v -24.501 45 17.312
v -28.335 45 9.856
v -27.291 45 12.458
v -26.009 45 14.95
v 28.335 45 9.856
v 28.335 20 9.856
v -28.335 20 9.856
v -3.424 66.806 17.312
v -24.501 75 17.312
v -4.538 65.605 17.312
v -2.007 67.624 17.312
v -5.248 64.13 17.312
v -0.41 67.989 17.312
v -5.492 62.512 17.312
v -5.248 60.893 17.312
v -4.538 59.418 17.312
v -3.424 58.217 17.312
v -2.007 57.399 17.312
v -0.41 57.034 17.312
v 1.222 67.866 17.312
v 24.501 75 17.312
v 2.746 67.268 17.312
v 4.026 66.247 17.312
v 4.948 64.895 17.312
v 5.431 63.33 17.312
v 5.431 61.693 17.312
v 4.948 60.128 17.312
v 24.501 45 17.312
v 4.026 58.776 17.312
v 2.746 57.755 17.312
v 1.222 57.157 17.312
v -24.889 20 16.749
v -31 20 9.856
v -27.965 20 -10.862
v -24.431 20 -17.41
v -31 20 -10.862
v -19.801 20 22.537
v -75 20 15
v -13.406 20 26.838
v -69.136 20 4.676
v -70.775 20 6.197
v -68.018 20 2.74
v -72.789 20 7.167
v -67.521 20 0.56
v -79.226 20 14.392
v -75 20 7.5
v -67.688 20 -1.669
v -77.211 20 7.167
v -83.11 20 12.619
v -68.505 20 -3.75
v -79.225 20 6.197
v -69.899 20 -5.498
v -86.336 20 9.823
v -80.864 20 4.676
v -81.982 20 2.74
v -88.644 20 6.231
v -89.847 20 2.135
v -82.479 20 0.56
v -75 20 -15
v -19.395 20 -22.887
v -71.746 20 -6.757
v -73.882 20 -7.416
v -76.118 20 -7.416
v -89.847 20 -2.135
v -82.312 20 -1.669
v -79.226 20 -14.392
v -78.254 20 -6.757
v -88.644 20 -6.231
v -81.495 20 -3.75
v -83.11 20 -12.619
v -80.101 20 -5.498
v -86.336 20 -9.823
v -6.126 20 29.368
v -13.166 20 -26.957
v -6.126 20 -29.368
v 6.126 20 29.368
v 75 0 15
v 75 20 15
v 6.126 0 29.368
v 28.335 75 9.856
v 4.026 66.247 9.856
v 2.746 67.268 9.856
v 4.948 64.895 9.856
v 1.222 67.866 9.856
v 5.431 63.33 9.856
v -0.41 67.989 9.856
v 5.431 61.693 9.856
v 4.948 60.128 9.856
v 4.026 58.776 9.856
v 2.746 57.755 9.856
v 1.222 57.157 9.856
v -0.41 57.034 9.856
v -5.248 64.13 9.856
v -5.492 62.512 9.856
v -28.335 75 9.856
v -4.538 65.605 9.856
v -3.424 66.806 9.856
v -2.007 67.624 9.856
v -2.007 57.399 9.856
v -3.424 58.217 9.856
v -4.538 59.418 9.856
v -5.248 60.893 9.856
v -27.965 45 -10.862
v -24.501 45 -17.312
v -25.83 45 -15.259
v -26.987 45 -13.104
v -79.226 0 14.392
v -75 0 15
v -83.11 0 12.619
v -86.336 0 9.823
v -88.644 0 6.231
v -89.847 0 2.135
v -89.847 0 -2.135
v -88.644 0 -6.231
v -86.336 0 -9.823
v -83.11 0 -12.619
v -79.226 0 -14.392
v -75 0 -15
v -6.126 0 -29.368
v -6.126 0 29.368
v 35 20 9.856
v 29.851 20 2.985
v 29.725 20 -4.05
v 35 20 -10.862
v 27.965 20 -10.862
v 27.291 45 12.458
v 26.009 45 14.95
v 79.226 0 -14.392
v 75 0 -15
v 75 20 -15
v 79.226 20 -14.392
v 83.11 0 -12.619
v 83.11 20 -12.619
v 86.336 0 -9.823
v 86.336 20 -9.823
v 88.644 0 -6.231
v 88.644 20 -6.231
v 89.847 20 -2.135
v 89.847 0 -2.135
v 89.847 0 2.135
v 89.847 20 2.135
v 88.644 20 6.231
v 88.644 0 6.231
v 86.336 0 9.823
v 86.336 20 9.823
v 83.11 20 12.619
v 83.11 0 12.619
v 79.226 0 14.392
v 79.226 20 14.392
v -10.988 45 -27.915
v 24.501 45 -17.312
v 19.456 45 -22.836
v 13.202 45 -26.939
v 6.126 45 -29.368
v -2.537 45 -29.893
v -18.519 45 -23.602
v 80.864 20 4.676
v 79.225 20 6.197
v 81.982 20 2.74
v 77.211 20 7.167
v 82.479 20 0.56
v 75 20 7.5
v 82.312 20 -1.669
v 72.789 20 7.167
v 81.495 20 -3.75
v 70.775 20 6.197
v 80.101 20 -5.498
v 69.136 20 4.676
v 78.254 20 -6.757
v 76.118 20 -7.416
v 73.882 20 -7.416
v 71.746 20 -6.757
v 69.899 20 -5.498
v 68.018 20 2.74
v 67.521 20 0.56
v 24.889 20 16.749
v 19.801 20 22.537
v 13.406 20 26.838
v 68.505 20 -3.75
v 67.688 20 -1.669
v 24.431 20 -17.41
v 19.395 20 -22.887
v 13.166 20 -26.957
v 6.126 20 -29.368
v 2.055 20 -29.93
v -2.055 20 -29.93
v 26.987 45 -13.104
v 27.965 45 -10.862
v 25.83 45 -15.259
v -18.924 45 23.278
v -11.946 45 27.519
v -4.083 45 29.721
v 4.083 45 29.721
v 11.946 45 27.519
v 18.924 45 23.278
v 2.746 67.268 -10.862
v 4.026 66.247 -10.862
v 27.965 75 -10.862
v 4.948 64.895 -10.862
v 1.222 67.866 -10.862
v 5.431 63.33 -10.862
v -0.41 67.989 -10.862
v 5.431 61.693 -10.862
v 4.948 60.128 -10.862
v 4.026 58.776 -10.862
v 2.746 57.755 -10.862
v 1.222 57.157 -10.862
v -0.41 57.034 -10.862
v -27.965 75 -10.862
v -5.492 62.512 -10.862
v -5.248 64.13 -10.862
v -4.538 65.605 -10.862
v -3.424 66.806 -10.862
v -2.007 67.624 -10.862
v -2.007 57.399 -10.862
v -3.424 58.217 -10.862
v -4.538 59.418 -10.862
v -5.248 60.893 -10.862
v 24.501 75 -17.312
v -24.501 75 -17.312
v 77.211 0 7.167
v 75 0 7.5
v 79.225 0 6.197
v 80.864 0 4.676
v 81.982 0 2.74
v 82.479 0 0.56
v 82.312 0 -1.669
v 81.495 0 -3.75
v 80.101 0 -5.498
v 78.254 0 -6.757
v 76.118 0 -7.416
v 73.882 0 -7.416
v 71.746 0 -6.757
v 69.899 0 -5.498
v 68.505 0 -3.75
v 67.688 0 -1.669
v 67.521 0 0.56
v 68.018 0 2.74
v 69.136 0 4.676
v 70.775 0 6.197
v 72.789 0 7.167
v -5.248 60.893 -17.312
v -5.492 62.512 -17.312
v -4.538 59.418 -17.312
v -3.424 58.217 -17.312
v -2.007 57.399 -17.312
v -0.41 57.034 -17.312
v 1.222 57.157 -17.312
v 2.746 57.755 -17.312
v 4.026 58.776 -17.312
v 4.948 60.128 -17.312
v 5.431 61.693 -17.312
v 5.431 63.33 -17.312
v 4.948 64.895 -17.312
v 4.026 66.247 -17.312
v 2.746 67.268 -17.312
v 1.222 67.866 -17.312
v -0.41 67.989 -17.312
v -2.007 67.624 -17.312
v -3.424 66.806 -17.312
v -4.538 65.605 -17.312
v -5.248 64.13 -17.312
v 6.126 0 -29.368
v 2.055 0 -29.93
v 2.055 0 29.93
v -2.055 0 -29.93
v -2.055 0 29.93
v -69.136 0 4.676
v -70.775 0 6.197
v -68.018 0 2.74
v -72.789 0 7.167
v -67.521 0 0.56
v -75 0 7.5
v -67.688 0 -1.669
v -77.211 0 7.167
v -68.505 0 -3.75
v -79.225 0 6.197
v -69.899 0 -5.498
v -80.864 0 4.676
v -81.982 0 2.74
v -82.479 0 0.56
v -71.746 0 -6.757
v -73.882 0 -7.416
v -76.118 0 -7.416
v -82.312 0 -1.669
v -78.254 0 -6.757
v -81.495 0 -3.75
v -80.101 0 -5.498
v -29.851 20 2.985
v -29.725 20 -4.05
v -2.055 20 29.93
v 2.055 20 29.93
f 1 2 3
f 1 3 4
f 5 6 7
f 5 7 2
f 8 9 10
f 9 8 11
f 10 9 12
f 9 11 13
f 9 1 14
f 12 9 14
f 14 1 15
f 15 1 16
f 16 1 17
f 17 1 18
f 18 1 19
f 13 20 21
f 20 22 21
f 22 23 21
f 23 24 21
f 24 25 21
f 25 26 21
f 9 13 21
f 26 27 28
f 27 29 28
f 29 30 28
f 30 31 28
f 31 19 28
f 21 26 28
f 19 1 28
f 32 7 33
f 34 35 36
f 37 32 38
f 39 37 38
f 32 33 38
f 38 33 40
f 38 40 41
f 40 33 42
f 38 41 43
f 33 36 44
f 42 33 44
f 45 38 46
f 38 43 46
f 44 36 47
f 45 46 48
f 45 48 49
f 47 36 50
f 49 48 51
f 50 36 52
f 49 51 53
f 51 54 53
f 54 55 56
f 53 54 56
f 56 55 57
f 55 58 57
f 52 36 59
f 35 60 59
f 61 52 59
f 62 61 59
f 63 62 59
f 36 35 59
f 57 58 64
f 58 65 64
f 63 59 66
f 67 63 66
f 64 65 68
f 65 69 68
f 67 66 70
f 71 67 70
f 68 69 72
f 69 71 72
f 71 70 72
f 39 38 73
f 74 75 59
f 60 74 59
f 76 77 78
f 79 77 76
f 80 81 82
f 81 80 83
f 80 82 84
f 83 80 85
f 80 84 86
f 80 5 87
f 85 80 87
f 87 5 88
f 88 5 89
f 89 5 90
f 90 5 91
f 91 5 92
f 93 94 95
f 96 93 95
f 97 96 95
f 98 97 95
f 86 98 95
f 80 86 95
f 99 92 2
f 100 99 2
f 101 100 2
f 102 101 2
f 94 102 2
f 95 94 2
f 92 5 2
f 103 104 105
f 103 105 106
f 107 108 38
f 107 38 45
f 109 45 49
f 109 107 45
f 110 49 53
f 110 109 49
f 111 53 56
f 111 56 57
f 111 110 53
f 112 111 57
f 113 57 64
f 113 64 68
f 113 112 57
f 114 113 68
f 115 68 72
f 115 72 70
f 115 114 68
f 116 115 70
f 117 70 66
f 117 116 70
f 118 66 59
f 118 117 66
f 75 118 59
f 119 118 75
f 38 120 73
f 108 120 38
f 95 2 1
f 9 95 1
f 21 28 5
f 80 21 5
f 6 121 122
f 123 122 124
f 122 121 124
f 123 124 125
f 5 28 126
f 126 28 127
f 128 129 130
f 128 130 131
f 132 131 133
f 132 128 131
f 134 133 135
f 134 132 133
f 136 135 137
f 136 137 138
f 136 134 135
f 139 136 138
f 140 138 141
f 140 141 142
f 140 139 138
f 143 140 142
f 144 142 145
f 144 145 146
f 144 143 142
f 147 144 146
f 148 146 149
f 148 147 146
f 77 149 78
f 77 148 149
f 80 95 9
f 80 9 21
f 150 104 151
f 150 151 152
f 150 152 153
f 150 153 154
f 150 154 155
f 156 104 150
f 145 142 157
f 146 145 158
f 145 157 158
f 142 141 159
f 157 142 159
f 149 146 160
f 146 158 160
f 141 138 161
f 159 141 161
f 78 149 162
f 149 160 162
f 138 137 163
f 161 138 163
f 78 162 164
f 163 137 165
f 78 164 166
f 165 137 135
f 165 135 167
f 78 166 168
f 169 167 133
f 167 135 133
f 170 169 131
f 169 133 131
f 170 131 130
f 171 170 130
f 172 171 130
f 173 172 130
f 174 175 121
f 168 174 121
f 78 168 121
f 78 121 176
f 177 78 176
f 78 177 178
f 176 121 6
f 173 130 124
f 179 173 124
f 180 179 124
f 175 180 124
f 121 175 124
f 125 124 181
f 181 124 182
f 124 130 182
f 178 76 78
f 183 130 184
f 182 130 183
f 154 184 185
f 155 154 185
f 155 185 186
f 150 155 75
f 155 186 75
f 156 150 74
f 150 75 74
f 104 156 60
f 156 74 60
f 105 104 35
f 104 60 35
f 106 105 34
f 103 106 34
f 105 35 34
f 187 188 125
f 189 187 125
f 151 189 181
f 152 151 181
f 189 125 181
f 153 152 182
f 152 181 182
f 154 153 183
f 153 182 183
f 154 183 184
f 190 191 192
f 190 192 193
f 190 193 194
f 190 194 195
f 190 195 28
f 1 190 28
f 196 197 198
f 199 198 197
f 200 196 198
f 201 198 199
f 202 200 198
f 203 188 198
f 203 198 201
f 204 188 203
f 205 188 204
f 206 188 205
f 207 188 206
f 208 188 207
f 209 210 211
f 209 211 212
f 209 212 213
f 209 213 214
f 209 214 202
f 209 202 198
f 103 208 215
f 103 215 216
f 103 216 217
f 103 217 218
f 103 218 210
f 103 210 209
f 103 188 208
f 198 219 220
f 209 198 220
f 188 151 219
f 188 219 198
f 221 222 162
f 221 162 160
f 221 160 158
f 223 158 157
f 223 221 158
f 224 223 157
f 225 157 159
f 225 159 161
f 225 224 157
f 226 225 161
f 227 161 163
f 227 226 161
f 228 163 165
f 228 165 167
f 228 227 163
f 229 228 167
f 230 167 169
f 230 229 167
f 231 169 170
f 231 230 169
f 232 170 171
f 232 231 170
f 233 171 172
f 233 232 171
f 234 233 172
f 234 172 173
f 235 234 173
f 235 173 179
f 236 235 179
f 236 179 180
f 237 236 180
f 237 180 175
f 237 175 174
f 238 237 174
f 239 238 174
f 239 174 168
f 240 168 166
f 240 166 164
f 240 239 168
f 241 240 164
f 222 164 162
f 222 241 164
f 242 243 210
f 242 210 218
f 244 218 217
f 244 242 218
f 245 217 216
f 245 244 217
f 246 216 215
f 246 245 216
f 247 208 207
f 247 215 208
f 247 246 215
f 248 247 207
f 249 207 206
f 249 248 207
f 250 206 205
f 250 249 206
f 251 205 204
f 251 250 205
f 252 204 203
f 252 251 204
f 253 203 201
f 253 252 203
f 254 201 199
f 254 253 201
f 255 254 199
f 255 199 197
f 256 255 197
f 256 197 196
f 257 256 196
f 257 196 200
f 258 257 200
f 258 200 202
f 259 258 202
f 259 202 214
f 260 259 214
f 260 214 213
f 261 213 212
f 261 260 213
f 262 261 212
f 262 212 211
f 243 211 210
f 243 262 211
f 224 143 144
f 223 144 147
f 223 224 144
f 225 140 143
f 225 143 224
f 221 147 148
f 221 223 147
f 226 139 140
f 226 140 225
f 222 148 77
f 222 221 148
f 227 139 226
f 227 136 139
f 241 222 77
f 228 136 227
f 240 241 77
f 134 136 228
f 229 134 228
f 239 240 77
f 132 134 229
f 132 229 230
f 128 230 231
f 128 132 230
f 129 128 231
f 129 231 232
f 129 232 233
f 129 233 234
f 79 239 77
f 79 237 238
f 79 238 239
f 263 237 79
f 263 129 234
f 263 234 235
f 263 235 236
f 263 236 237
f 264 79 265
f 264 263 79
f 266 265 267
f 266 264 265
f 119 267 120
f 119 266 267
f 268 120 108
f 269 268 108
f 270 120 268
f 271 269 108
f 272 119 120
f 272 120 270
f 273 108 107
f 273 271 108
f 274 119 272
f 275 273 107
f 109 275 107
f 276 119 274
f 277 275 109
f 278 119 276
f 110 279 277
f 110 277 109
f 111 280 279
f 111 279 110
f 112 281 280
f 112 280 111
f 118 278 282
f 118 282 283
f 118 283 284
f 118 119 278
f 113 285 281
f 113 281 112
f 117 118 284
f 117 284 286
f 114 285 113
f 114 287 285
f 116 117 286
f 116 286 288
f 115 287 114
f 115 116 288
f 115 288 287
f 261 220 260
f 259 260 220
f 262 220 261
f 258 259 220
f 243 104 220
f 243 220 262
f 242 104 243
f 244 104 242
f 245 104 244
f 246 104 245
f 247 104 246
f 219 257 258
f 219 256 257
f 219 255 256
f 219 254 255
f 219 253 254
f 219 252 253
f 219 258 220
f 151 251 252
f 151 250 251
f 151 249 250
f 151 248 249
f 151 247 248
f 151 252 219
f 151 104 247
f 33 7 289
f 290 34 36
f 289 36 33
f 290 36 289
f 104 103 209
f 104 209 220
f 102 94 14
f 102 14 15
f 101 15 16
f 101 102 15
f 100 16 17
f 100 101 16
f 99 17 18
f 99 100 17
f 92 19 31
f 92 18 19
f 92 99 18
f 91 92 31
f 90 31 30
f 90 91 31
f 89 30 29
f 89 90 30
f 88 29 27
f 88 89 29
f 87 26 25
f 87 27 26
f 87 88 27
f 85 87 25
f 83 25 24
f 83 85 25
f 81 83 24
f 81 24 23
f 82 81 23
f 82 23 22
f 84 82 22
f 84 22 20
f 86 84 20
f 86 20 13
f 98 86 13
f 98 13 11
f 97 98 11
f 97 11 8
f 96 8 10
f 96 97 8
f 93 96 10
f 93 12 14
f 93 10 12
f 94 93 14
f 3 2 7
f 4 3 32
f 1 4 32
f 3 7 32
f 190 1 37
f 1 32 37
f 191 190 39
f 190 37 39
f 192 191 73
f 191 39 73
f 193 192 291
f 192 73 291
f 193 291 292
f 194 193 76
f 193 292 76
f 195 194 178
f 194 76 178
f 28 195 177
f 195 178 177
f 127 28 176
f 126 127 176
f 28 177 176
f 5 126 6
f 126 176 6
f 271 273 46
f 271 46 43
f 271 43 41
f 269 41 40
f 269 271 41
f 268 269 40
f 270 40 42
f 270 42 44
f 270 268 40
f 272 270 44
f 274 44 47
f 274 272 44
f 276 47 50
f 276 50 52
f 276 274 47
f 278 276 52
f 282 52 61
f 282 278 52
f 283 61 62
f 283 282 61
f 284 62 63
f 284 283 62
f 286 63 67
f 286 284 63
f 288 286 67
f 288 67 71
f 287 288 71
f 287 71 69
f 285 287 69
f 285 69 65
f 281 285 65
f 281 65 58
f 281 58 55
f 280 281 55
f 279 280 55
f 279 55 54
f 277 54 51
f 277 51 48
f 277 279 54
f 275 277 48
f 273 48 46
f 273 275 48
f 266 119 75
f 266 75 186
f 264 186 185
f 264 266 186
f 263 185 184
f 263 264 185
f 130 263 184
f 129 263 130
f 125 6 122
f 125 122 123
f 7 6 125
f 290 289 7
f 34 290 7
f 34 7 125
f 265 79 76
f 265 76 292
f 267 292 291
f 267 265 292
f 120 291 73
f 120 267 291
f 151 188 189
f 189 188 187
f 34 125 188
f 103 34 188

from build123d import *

# Parameters (mm, degrees)
CROQUIS2_R                 = 7.5
SALIENTE_EXTRUIR3_DEPTH    = 20
CROQUIS6_R                 = 30
SALIENTE_EXTRUIR4_DEPTH    = 25
CORTAR_EXTRUIR1_DEPTH      = 35
CORTAR_EXTRUIR1_DEPTH_BACK = 31
CROQUIS9_W                 = 20.718126327
CROQUIS9_H                 = 25
SALIENTE_EXTRUIR5_DEPTH    = 30
CORTAR_EXTRUIR2_DEPTH      = 15
CORTAR_EXTRUIR2_DEPTH_BACK = 38
CROQUIS11_R                = 5.492388524


with BuildPart() as part:
    # Croquis2 → Saliente-Extruir3 (new body)
    with BuildSketch(Plane(origin=(0, 0, 0), x_dir=(1, 0, 0), z_dir=(0, 1, 0))):
        with BuildLine():
            Line((-75, 15), (-6.126443354, 29.36778323))
            ThreePointArc((-6.126443354, 29.36778323), (0, 30), (6.126443354, 29.36778323))
            Line((6.126443354, 29.36778323), (75, 15))
            ThreePointArc((75, 15), (90, 0), (75, -15))
            Line((75, -15), (6.126443354, -29.36778323))
            ThreePointArc((6.126443354, -29.36778323), (0, -30), (-6.126443354, -29.36778323))
            Line((-6.126443354, -29.36778323), (-75, -15))
            ThreePointArc((-75, -15), (-90, 0), (-75, 15))
        make_face()
        with Locations((-75, 0)):
            Circle(CROQUIS2_R, mode=Mode.SUBTRACT)
        with Locations((75, 0)):
            Circle(CROQUIS2_R, mode=Mode.SUBTRACT)
    extrude(amount=SALIENTE_EXTRUIR3_DEPTH)

    # Croquis6 → Saliente-Extruir4 (add)
    with BuildSketch(Plane(origin=(0, 20, 0), x_dir=(1, 0, 0), z_dir=(0, 1, 0))):
        Circle(CROQUIS6_R)
    extrude(amount=SALIENTE_EXTRUIR4_DEPTH)

    # Croquis9 → Cortar-Extruir1 (cut, two sides: drawn at the far end of the back side and taken through both)
    with BuildSketch(Plane(origin=(0, 0, 0), x_dir=(0, 0, -1), z_dir=(1, 0, 0)).offset(-CORTAR_EXTRUIR1_DEPTH_BACK)):
        with Locations((0.502867144, 32.5)):
            Rectangle(CROQUIS9_W, CROQUIS9_H)
    extrude(amount=CORTAR_EXTRUIR1_DEPTH + CORTAR_EXTRUIR1_DEPTH_BACK, mode=Mode.SUBTRACT)

    # Croquis10 → Saliente-Extruir5 (add)
    with BuildSketch(Plane(origin=(0, 45, 0), x_dir=(1, 0, 0), z_dir=(0, 1, 0))):
        Polygon((-24.500615631, 17.312418483), (24.500615631, 17.312418483), (27.964593149, 10.861930307), (-27.964593149, 10.861930307), align=None)
        Polygon((-28.334703105, -9.85619602), (-24.500615631, -17.312418483), (24.500615631, -17.312418483), (28.334703105, -9.85619602), align=None)
    extrude(amount=SALIENTE_EXTRUIR5_DEPTH)

    # Croquis11 → Cortar-Extruir2 (cut, two sides: drawn at the far end of the back side and taken through both)
    with BuildSketch(Plane.XY.offset(17.312418483).offset(-CORTAR_EXTRUIR2_DEPTH_BACK)):
        with Locations((0, 62.511511295)):
            Circle(CROQUIS11_R)
    extrude(amount=CORTAR_EXTRUIR2_DEPTH + CORTAR_EXTRUIR2_DEPTH_BACK, mode=Mode.SUBTRACT)


solid = part.part
